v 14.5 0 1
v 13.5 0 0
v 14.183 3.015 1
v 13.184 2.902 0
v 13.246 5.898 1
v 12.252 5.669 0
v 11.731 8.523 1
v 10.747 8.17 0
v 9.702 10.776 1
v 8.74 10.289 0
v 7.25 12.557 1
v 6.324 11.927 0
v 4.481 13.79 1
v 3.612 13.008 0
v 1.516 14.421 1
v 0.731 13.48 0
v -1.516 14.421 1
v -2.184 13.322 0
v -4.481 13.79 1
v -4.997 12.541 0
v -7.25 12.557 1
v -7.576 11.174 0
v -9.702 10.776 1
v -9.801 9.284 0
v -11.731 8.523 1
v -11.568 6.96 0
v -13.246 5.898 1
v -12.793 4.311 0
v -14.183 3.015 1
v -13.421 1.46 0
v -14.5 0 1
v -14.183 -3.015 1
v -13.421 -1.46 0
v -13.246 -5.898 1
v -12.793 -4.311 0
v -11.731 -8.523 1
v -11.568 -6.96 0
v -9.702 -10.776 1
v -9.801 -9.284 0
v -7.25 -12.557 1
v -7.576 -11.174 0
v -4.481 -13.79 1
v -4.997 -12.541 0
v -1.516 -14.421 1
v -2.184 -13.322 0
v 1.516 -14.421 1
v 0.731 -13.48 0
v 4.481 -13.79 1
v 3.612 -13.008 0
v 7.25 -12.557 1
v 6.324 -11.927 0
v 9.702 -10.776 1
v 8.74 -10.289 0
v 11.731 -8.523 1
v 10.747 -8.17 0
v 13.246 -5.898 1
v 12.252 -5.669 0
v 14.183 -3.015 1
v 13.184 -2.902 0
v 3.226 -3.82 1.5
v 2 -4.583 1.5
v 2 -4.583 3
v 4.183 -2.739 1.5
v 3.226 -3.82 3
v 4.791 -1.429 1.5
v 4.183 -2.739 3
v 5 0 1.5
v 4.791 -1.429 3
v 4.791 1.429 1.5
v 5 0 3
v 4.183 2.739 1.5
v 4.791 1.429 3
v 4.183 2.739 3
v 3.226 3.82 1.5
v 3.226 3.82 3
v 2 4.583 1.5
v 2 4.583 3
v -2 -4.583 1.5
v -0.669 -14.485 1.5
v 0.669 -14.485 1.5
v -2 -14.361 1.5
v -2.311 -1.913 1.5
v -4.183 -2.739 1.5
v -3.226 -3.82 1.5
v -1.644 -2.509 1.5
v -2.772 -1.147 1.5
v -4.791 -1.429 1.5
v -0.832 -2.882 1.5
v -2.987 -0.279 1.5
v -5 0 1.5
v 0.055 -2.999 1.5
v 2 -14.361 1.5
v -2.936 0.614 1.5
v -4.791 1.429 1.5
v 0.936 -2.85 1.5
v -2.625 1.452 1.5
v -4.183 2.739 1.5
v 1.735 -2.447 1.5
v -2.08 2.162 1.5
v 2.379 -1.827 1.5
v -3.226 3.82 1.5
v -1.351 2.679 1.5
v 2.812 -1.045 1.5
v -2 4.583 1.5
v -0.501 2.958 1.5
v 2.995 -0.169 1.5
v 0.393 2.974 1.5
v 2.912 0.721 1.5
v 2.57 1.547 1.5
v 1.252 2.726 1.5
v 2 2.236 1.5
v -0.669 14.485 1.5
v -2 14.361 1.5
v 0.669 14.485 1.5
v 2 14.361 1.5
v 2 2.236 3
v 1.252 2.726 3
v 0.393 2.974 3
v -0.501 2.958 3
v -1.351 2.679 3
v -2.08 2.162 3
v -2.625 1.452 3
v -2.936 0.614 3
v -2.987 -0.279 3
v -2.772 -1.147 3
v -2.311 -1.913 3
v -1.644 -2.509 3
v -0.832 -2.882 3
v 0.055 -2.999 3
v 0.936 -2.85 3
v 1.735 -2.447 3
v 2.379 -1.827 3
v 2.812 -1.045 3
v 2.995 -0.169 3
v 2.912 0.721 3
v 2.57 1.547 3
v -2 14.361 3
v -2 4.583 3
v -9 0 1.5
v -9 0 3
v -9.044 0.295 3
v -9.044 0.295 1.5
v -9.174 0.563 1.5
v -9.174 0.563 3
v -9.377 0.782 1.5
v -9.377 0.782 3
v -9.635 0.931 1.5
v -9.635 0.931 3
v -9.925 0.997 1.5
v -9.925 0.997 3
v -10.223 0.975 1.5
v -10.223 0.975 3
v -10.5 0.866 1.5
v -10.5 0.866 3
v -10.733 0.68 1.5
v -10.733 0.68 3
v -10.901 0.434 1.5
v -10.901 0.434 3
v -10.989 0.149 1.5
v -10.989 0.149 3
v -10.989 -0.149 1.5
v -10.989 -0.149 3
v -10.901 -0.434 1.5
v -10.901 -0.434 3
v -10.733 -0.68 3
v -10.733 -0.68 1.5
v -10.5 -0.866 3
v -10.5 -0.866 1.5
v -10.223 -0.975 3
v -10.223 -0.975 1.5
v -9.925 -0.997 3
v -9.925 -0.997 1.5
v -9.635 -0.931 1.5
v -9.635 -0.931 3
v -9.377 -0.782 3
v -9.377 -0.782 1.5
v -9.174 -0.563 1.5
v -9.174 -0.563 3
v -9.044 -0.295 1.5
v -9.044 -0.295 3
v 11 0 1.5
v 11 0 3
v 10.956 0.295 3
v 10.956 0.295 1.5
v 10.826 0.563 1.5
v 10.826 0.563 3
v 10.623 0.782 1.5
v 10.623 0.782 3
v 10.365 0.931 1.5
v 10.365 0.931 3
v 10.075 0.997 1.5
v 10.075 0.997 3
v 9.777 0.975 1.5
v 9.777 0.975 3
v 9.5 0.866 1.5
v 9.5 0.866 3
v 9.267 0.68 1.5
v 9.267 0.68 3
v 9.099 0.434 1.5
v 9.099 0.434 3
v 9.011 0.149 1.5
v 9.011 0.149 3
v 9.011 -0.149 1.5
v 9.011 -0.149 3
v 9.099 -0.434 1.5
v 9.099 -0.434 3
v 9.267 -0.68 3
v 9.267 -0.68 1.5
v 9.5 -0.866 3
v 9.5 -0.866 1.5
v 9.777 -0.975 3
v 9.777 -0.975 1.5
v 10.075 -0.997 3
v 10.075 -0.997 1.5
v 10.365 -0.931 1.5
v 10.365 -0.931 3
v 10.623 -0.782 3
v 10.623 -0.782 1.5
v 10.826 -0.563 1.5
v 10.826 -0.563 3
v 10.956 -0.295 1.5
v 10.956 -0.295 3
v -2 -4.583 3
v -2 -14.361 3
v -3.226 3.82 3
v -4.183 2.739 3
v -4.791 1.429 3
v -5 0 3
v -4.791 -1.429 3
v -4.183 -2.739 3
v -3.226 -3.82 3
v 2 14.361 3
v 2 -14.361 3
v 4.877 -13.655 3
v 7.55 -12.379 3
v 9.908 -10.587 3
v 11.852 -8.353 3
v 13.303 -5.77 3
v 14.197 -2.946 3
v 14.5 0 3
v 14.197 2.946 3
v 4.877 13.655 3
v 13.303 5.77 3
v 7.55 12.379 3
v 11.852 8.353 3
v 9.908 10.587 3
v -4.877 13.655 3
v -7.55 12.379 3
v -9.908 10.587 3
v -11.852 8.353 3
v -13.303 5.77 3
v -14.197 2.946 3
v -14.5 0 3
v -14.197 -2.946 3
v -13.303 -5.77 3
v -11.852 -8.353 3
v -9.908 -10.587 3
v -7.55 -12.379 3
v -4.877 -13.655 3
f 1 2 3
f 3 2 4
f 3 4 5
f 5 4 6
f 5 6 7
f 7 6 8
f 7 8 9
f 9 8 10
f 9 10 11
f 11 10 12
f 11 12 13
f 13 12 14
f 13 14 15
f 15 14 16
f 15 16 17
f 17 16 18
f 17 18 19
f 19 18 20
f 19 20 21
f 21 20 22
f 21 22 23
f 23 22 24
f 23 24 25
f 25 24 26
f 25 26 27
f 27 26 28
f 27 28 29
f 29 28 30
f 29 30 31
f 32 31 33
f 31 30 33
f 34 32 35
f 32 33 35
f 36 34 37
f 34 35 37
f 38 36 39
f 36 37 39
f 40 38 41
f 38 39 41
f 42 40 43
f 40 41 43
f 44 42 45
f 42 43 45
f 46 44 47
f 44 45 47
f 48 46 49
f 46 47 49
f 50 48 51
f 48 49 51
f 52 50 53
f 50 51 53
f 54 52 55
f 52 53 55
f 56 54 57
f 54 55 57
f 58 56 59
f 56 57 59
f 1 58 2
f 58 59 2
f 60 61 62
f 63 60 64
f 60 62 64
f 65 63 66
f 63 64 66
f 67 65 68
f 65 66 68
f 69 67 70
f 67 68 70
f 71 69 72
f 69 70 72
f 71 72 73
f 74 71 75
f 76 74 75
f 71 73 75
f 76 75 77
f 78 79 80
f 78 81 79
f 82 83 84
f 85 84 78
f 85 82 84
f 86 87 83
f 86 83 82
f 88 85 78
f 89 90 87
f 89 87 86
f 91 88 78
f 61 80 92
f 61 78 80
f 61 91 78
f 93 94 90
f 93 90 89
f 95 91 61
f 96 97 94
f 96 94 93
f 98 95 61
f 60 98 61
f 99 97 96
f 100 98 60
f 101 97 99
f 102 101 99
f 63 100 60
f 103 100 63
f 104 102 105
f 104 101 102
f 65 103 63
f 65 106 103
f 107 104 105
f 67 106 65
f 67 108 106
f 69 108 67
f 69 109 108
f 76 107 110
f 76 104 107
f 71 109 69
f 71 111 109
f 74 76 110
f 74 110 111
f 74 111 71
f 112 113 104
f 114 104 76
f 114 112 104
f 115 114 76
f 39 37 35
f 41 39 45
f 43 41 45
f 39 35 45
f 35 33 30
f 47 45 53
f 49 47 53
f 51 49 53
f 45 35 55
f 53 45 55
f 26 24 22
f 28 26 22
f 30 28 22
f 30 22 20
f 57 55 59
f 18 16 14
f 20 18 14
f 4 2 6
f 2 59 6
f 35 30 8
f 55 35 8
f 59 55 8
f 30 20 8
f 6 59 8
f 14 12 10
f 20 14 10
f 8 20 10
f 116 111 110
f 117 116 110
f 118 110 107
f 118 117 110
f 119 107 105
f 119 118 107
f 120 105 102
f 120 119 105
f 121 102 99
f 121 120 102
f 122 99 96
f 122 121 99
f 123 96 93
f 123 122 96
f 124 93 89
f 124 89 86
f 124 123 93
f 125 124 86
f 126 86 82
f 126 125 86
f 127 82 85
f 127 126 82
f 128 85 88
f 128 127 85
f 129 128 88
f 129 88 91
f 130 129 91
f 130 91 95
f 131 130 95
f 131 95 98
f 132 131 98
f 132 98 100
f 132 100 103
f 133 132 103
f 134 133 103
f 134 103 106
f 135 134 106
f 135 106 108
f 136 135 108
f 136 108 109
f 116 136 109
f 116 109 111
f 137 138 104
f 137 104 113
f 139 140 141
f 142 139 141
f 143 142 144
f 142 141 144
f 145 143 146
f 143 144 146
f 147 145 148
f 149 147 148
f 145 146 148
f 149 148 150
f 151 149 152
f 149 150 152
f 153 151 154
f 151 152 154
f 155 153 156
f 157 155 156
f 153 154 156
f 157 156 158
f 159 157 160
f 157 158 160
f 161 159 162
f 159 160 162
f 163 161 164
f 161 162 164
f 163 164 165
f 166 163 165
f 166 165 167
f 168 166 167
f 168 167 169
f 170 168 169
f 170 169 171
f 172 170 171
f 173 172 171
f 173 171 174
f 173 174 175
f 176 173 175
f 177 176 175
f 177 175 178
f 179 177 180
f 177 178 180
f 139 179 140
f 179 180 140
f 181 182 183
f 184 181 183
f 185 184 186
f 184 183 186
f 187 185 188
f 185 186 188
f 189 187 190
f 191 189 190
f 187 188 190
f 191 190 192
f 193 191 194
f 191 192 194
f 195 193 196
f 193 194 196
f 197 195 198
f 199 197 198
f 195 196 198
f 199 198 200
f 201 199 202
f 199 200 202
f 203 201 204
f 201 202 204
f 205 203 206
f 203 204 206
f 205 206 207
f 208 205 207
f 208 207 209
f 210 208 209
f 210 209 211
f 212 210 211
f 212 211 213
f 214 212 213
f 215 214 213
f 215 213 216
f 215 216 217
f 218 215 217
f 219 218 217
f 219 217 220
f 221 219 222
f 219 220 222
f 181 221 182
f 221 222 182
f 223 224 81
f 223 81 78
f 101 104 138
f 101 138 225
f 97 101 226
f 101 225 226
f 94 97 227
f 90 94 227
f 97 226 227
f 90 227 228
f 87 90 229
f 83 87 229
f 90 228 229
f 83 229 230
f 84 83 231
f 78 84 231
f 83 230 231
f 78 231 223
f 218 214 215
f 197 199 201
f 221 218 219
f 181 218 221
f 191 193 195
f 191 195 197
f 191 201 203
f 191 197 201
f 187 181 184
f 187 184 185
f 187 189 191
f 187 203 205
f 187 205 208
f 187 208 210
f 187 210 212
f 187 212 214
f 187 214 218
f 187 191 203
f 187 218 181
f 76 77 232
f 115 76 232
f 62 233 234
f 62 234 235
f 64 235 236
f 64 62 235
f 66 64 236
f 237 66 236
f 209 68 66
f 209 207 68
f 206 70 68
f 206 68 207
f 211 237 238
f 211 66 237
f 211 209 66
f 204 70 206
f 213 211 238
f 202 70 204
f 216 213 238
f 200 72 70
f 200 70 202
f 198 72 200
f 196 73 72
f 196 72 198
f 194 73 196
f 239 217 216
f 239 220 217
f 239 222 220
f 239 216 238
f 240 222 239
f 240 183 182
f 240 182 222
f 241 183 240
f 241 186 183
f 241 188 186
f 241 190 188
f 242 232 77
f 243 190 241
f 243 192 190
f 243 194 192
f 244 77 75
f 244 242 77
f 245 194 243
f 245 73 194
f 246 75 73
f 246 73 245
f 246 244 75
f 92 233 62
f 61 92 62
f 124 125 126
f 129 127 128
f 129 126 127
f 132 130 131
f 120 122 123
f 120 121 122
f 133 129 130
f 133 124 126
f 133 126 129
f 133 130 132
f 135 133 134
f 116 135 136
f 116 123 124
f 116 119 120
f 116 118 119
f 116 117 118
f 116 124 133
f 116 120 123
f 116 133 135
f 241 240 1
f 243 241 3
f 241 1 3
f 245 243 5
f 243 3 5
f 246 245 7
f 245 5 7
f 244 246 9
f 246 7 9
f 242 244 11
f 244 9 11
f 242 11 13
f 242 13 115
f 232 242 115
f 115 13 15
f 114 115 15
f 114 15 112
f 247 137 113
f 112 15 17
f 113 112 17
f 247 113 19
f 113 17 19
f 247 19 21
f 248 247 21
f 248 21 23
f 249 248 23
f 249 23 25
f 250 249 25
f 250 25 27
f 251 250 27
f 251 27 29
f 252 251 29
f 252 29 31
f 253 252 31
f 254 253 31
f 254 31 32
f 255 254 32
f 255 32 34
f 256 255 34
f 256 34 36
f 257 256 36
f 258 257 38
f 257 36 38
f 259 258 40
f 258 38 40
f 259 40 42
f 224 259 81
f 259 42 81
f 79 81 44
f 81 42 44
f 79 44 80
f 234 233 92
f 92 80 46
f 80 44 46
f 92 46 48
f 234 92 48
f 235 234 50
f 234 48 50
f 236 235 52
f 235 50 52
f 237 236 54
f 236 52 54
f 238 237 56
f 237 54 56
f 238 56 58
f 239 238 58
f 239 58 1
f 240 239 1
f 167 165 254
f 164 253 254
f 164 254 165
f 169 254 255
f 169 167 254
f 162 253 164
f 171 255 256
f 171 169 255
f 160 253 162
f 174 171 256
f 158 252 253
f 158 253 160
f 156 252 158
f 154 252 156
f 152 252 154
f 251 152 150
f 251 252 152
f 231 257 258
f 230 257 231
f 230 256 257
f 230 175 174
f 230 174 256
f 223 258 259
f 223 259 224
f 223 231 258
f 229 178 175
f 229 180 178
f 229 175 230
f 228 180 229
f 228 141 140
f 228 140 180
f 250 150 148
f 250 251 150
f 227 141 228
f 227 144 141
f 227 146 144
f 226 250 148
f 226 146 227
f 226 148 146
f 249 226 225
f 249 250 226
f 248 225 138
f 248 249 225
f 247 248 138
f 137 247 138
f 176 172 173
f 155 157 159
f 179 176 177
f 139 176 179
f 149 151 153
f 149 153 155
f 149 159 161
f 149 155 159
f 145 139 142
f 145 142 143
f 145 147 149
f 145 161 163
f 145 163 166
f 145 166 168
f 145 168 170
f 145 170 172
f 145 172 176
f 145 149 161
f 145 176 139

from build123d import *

# Parameters (mm, degrees)
F0_R     = 14.5
F1_DEPTH = 3
F2_W     = 4
F2_H     = 30
F3_DEPTH = 1.5
F4_R     = 5
F4_R_2   = 3
F5_DEPTH = 1.5
F6_R     = 3
F7_DEPTH = 1.5
F8_R     = 1
F9_DEPTH = 1.5
F10_SIZE = 1


with BuildPart() as f1:
    # F0 (on Top) → F1 (new body)
    with BuildSketch(Plane.XY):
        Circle(F0_R)
    extrude(amount=F1_DEPTH)

    # F2 (on face) → F3 (cut)
    with BuildSketch(Plane.XY.offset(3)):
        Rectangle(F2_W, F2_H)
    extrude(amount=-F3_DEPTH, mode=Mode.SUBTRACT)

    # F4 (on face) → F5 (cut)
    with BuildSketch(Plane.XY.offset(3)):
        Circle(F4_R)
        Circle(F4_R_2, mode=Mode.SUBTRACT)
    extrude(amount=-F5_DEPTH, mode=Mode.SUBTRACT)

    # F6 (on face) → F7 (join)
    with BuildSketch(Plane.XY.offset(3)):
        Circle(F6_R)
    extrude(amount=-F7_DEPTH)

    # F8 (on face) → F9 (cut)
    with BuildSketch(Plane.XY.offset(3)):
        with Locations((10, 0)):
            Circle(F8_R)
        with Locations((-10, 0)):
            Circle(F8_R)
    extrude(amount=-F9_DEPTH, mode=Mode.SUBTRACT)

    # F10
    f10_edges = [f1.edges().sort_by_distance(p)[0] for p in [
        (-14.5, 0, 0),
    ]]
    chamfer(f10_edges, length=F10_SIZE)


solid = f1.part
